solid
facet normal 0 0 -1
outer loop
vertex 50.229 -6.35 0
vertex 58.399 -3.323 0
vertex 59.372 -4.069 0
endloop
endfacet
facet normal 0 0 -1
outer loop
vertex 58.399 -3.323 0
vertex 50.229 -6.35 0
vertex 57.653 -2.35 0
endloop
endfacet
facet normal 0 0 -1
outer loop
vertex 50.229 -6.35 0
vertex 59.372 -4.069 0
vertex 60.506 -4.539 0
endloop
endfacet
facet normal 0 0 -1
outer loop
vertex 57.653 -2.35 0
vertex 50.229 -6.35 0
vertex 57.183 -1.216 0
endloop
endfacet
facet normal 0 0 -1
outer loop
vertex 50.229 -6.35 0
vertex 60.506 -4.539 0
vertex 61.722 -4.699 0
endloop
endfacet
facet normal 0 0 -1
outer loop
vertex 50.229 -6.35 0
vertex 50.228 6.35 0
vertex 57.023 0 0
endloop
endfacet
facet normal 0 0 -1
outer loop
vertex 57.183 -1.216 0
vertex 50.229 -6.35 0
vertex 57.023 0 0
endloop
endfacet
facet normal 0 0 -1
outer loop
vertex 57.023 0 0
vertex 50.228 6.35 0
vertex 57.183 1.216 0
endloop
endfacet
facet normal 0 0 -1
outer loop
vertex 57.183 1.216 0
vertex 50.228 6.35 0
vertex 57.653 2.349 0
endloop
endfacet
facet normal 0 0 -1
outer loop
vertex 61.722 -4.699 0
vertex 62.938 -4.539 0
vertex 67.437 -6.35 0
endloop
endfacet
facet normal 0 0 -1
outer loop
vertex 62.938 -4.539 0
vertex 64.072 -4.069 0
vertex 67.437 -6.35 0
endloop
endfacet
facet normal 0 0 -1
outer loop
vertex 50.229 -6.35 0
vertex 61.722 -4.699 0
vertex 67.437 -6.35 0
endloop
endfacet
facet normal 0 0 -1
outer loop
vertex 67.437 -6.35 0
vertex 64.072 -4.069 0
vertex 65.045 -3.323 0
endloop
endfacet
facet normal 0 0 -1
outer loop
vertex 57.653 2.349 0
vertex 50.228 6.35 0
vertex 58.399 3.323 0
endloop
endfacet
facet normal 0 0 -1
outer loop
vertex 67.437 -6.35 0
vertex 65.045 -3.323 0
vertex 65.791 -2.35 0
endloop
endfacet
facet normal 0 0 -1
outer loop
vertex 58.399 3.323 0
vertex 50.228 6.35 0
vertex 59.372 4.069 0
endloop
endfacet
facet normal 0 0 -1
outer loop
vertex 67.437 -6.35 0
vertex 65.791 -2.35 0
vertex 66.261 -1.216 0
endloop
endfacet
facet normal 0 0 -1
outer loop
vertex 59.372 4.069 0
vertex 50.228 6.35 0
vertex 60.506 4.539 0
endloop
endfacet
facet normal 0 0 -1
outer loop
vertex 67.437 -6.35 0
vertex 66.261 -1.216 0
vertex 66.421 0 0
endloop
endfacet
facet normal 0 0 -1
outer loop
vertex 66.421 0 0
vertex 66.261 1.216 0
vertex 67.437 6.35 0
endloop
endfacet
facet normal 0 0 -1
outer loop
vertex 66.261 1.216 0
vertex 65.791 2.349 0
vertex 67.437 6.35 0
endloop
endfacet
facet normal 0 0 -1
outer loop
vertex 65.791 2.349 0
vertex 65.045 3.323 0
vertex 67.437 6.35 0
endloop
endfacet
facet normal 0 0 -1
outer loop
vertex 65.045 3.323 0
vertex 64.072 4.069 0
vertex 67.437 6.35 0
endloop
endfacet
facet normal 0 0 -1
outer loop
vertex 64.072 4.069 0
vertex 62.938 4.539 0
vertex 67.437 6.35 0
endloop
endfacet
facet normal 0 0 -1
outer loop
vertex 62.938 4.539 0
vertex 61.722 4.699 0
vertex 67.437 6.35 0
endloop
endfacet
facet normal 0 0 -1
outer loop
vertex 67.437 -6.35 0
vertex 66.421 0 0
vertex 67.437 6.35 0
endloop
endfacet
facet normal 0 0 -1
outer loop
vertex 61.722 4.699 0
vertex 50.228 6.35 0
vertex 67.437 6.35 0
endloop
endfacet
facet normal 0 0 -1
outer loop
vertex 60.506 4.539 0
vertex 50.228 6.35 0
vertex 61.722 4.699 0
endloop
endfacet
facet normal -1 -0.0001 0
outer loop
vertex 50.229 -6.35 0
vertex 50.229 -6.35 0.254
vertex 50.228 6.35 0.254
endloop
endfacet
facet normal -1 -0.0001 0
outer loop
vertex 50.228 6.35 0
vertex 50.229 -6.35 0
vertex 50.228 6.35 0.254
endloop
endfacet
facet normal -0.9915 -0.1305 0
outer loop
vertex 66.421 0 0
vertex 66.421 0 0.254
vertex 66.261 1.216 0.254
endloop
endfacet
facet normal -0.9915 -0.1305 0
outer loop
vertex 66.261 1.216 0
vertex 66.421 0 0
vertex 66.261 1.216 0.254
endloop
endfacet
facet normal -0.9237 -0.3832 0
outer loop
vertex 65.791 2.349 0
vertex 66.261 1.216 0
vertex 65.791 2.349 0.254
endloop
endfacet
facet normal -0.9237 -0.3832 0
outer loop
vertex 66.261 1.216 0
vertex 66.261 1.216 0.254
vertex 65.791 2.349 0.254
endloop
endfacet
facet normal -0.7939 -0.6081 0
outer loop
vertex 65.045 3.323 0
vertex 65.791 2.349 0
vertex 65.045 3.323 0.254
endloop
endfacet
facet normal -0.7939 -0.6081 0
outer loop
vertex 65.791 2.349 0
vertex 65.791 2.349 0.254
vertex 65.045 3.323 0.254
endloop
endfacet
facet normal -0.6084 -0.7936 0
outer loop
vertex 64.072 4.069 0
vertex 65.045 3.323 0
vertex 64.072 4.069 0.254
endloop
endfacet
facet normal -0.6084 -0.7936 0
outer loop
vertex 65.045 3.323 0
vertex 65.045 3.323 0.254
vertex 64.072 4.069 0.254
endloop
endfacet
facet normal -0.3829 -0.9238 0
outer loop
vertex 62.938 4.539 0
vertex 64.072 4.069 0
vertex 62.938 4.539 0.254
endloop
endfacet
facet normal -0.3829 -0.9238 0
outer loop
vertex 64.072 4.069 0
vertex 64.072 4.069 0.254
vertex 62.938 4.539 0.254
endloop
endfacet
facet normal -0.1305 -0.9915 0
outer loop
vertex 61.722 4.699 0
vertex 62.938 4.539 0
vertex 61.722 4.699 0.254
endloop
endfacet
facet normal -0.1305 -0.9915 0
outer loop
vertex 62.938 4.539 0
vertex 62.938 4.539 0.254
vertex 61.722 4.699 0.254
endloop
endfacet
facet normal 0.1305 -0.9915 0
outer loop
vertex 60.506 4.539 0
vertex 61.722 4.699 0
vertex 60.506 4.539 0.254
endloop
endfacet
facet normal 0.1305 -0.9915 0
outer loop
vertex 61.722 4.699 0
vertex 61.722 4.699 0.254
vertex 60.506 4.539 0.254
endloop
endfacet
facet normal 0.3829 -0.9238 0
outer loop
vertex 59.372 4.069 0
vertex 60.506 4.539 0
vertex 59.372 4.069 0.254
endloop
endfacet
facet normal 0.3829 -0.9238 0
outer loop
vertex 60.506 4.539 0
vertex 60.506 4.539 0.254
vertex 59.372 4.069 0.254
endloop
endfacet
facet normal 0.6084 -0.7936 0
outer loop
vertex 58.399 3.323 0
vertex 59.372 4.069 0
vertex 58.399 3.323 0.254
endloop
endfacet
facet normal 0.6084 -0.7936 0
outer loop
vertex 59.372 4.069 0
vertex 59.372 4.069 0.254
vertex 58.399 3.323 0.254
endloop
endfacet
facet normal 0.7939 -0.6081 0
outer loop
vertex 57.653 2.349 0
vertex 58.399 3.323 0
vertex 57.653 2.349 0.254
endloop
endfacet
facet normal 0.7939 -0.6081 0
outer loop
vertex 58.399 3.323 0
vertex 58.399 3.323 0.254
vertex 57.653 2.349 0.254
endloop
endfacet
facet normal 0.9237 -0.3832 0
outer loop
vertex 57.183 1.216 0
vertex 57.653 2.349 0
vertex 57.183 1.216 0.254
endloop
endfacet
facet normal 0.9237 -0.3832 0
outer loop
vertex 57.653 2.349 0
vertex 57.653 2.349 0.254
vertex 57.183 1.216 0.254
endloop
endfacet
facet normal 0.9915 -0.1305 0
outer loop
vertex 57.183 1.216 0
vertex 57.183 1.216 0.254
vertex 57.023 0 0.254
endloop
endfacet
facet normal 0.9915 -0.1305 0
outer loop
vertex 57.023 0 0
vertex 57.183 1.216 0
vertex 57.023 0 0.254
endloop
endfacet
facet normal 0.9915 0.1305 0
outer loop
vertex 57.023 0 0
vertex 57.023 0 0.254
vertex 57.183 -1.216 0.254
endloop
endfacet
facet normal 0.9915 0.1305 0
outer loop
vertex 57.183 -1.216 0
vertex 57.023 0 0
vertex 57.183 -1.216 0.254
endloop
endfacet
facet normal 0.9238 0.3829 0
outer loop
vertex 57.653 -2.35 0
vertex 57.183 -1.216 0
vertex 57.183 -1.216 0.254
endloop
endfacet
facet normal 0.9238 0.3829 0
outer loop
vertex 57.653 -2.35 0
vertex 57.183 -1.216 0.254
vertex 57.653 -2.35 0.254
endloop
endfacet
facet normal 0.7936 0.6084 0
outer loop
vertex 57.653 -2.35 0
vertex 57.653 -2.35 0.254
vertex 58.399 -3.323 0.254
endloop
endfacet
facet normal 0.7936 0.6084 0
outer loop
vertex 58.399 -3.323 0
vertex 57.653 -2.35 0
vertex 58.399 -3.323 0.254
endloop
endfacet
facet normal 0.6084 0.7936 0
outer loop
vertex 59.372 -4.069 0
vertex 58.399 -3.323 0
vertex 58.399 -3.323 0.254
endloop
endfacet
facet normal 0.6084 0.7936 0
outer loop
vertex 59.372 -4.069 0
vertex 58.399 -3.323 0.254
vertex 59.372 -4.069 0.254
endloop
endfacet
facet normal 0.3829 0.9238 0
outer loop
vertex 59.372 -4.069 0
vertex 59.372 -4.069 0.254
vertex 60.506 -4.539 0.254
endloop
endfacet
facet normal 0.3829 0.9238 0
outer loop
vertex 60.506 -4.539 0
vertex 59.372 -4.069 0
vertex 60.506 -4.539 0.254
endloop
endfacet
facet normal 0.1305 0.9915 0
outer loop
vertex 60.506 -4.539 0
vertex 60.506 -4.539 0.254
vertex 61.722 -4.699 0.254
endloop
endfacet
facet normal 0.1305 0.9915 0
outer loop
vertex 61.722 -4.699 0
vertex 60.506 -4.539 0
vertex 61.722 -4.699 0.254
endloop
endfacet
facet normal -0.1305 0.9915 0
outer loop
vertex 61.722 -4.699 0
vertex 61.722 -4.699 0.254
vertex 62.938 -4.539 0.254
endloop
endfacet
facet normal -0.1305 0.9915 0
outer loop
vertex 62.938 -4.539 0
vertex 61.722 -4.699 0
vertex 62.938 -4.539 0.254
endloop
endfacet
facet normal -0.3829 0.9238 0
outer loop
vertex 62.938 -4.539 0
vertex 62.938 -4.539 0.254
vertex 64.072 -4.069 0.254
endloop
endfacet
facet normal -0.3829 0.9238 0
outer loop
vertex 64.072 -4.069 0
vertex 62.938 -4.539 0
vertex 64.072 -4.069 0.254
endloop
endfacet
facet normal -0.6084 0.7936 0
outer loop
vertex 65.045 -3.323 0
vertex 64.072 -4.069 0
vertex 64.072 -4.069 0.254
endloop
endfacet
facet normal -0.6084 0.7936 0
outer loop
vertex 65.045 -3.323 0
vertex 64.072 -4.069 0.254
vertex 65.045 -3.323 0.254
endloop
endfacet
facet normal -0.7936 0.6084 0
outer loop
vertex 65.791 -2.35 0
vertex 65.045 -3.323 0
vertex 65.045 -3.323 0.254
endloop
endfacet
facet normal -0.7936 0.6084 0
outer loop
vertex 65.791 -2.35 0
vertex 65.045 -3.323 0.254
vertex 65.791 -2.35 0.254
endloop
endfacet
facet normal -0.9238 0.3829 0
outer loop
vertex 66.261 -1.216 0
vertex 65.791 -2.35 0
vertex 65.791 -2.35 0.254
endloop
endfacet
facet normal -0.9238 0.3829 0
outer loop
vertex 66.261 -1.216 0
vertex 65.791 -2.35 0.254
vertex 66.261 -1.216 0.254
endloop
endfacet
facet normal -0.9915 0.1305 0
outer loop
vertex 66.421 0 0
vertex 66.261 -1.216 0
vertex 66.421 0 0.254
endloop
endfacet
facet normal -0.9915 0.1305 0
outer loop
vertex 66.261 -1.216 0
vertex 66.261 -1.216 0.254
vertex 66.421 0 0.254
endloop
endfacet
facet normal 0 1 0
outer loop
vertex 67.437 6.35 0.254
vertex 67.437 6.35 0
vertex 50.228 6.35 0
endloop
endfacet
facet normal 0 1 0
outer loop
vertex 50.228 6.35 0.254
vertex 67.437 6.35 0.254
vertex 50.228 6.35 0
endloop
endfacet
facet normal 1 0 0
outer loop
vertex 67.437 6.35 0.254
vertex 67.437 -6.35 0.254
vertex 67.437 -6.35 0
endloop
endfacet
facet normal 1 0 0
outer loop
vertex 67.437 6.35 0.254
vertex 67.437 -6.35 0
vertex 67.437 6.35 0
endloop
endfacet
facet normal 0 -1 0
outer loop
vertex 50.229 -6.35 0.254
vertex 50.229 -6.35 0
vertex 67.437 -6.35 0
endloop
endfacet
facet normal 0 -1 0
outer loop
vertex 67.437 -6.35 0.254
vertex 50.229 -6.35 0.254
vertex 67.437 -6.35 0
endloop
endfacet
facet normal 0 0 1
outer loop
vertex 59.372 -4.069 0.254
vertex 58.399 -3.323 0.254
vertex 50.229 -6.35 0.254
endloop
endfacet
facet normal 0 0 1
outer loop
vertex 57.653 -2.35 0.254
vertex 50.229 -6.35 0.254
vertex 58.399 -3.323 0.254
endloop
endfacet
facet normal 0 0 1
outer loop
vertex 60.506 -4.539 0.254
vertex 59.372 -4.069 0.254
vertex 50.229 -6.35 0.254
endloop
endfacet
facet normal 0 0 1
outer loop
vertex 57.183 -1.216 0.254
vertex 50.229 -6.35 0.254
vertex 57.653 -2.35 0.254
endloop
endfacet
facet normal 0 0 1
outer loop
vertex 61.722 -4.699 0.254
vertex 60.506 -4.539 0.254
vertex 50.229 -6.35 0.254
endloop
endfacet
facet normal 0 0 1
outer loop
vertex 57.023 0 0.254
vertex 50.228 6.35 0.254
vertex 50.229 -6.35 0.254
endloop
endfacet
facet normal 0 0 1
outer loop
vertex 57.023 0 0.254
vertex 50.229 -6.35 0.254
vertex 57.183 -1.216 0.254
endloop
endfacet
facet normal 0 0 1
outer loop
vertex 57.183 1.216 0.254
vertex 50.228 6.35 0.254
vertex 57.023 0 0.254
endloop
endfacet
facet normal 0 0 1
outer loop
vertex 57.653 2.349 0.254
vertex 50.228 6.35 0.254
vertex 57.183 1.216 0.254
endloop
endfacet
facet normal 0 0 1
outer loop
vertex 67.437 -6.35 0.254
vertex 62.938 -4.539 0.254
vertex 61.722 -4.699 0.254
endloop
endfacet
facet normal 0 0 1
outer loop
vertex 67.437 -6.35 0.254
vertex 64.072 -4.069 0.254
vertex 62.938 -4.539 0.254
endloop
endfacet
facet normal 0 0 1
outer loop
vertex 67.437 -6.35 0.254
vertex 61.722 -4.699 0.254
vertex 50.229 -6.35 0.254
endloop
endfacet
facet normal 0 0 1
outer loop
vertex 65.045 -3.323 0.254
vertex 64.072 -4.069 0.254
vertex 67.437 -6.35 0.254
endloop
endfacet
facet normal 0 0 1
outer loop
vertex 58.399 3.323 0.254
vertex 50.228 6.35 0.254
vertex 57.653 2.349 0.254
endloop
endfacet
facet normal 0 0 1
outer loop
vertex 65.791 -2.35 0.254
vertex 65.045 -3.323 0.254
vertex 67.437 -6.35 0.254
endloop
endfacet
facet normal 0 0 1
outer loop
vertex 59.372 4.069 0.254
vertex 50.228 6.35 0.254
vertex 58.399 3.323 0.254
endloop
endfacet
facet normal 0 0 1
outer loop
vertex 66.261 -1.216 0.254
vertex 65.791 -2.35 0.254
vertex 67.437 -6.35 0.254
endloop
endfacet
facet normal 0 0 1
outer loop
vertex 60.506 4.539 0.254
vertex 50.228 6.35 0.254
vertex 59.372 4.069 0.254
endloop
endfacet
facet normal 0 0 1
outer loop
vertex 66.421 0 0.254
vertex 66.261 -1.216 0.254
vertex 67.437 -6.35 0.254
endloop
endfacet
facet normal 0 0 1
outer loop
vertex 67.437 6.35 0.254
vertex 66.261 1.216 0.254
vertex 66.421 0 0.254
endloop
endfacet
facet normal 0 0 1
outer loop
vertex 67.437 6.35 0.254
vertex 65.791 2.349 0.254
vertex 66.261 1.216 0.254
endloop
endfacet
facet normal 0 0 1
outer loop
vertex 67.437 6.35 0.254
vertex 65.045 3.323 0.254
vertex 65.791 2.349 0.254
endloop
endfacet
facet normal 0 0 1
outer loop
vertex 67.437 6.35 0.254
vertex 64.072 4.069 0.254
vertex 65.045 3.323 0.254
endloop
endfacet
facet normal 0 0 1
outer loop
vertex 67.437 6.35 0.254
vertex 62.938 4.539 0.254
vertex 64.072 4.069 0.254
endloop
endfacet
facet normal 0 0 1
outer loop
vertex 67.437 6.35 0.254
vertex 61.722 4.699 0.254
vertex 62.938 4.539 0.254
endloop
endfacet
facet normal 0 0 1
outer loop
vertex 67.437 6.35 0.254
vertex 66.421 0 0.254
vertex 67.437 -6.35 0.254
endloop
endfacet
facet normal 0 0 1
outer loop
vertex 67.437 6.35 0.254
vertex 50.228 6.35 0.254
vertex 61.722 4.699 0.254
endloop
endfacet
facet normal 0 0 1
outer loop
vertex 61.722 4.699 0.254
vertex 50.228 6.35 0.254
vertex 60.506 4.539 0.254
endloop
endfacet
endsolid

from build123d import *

# Parameters (mm, degrees)
BOSS_EXTRUDE1_DEPTH = 0.254
SKETCH2_R           = 4.699
CUT_EXTRUDE1_DEPTH  = 1.254
SKETCH3_W           = 2.54
SKETCH3_H           = 0.635
CUT_EXTRUDE2_DEPTH  = 1.254
SKETCH5_OUTSIDE_W   = 121.447
SKETCH5_OUTSIDE_H   = 109.618
SKETCH5_OUTSIDE_W_2 = 17.2085
SKETCH5_OUTSIDE_H_2 = 15.24
CUT_EXTRUDE5_DEPTH  = 1.254


with BuildPart() as part:
    # Sketch1 → Boss-Extrude1 (new body)
    with BuildSketch(Plane.XY):
        with BuildLine():
            Line((67.21146711, 76.191723231), (8.696654013, 17.676910134))
            Line((8.696654013, 17.676910134), (7.228954972, 14.133571205))
            ThreePointArc((7.228954972, 14.133571205), (14.666587579, 6.075099489), (15.105587123, -4.88230096))
            Line((15.105587123, -4.88230096), (18.648926052, -6.35))
            Line((18.648926052, -6.35), (101.401368334, -6.35))
            ThreePointArc((101.401368334, -6.35), (93.866160503, 38.880636728), (67.21146711, 76.191723231))
        make_face()
        with BuildLine():
            Line((88.672924278, 6.35), (27.86051193, 6.35))
            ThreePointArc((27.86051193, 6.35), (26.399857642, 10.93517908), (24.190484974, 15.210228852))
            Line((24.190484974, 15.210228852), (67.191354125, 58.211098004))
            ThreePointArc((67.191354125, 58.211098004), (82.13289044, 34.020557137), (88.672924278, 6.35))
        make_face(mode=Mode.SUBTRACT)
    extrude(amount=BOSS_EXTRUDE1_DEPTH)

    # Sketch2 → Cut-Extrude1 (cut, through all)
    with BuildSketch(Plane.XY.offset(0.254)):
        with Locations((22.225, 0)):
            Circle(SKETCH2_R)
        with Locations((36.195, 0)):
            Circle(SKETCH2_R)
        with Locations((61.722, 0)):
            Circle(SKETCH2_R)
        with Locations((75.692, 0)):
            Circle(SKETCH2_R)
        with Locations((95.25, 0)):
            Circle(SKETCH2_R)
        with Locations((15.715448212, 15.715448212)):
            Circle(SKETCH2_R)
        with Locations((25.593729945, 25.593729945)):
            Circle(SKETCH2_R)
        with Locations((43.644044748, 43.644044748)):
            Circle(SKETCH2_R)
        with Locations((53.522326482, 53.522326482)):
            Circle(SKETCH2_R)
        with Locations((92.004434954, 24.652514046)):
            Circle(SKETCH2_R)
        with Locations((82.48891971, 47.625)):
            Circle(SKETCH2_R)
        with Locations((67.351920908, 67.351920908)):
            Circle(SKETCH2_R)
    extrude(amount=-CUT_EXTRUDE1_DEPTH, mode=Mode.SUBTRACT)

    # Sketch3 → Cut-Extrude2 (cut, through all)
    with BuildSketch(Plane.XY.offset(0.254)):
        Polygon((15.266435406, 24.246691527), (17.06248663, 26.042742751), (17.511499436, 25.593729945), (15.715448212, 23.797678721), align=None)
        Polygon((44.991083167, 53.971339288), (43.195031942, 52.175288063), (43.644044748, 51.726275257), (45.440095973, 53.522326482), align=None)
        with Locations((29.21, -6.0325)):
            Rectangle(SKETCH3_W, SKETCH3_H)
        with Locations((68.707, -6.0325)):
            Rectangle(SKETCH3_W, SKETCH3_H)
        Polygon((29.230733674, 38.210989795), (31.026784898, 40.007041019), (31.475797704, 39.558028213), (29.67974648, 37.761976989), align=None)
        Polygon((56.845021246, 65.825277367), (55.048970022, 64.029226143), (55.497982828, 63.580213337), (57.294034052, 65.376264561), align=None)
        with Locations((48.9585, -6.0325)):
            Rectangle(SKETCH3_W, SKETCH3_H)
        with Locations((85.471, -6.0325)):
            Rectangle(SKETCH3_W, SKETCH3_H)
        Polygon((99.935462164, 14.437711971), (100.266998693, 11.919442024), (101.526133667, 12.085210288), (101.194597138, 14.603480236), align=None)
        Polygon((93.765504959, 37.464305742), (94.938831965, 37.950313702), (93.966816047, 40.296967714), (92.793489041, 39.810959755), align=None)
        Polygon((79.327792988, 62.471156422), (80.874047017, 60.456038938), (81.88160576, 61.229165953), (80.33535173, 63.244283437), align=None)
        Polygon((13.593916116, 7.005422516), (14.565932035, 4.658768503), (15.739259041, 5.144776462), (14.767243123, 7.491430475), align=None)
    extrude(amount=-CUT_EXTRUDE2_DEPTH, mode=Mode.SUBTRACT)

    # Sketch5 outside → Cut-Extrude5 (cut, through all)
    with BuildSketch(Plane.XY.offset(0.254)):
        with Locations((54.4145, 34.921)):
            Rectangle(SKETCH5_OUTSIDE_W, SKETCH5_OUTSIDE_H)
        with Locations((58.83275, 0)):
            Rectangle(SKETCH5_OUTSIDE_W_2, SKETCH5_OUTSIDE_H_2, mode=Mode.SUBTRACT)
    extrude(amount=-CUT_EXTRUDE5_DEPTH, mode=Mode.SUBTRACT)


solid = part.part
